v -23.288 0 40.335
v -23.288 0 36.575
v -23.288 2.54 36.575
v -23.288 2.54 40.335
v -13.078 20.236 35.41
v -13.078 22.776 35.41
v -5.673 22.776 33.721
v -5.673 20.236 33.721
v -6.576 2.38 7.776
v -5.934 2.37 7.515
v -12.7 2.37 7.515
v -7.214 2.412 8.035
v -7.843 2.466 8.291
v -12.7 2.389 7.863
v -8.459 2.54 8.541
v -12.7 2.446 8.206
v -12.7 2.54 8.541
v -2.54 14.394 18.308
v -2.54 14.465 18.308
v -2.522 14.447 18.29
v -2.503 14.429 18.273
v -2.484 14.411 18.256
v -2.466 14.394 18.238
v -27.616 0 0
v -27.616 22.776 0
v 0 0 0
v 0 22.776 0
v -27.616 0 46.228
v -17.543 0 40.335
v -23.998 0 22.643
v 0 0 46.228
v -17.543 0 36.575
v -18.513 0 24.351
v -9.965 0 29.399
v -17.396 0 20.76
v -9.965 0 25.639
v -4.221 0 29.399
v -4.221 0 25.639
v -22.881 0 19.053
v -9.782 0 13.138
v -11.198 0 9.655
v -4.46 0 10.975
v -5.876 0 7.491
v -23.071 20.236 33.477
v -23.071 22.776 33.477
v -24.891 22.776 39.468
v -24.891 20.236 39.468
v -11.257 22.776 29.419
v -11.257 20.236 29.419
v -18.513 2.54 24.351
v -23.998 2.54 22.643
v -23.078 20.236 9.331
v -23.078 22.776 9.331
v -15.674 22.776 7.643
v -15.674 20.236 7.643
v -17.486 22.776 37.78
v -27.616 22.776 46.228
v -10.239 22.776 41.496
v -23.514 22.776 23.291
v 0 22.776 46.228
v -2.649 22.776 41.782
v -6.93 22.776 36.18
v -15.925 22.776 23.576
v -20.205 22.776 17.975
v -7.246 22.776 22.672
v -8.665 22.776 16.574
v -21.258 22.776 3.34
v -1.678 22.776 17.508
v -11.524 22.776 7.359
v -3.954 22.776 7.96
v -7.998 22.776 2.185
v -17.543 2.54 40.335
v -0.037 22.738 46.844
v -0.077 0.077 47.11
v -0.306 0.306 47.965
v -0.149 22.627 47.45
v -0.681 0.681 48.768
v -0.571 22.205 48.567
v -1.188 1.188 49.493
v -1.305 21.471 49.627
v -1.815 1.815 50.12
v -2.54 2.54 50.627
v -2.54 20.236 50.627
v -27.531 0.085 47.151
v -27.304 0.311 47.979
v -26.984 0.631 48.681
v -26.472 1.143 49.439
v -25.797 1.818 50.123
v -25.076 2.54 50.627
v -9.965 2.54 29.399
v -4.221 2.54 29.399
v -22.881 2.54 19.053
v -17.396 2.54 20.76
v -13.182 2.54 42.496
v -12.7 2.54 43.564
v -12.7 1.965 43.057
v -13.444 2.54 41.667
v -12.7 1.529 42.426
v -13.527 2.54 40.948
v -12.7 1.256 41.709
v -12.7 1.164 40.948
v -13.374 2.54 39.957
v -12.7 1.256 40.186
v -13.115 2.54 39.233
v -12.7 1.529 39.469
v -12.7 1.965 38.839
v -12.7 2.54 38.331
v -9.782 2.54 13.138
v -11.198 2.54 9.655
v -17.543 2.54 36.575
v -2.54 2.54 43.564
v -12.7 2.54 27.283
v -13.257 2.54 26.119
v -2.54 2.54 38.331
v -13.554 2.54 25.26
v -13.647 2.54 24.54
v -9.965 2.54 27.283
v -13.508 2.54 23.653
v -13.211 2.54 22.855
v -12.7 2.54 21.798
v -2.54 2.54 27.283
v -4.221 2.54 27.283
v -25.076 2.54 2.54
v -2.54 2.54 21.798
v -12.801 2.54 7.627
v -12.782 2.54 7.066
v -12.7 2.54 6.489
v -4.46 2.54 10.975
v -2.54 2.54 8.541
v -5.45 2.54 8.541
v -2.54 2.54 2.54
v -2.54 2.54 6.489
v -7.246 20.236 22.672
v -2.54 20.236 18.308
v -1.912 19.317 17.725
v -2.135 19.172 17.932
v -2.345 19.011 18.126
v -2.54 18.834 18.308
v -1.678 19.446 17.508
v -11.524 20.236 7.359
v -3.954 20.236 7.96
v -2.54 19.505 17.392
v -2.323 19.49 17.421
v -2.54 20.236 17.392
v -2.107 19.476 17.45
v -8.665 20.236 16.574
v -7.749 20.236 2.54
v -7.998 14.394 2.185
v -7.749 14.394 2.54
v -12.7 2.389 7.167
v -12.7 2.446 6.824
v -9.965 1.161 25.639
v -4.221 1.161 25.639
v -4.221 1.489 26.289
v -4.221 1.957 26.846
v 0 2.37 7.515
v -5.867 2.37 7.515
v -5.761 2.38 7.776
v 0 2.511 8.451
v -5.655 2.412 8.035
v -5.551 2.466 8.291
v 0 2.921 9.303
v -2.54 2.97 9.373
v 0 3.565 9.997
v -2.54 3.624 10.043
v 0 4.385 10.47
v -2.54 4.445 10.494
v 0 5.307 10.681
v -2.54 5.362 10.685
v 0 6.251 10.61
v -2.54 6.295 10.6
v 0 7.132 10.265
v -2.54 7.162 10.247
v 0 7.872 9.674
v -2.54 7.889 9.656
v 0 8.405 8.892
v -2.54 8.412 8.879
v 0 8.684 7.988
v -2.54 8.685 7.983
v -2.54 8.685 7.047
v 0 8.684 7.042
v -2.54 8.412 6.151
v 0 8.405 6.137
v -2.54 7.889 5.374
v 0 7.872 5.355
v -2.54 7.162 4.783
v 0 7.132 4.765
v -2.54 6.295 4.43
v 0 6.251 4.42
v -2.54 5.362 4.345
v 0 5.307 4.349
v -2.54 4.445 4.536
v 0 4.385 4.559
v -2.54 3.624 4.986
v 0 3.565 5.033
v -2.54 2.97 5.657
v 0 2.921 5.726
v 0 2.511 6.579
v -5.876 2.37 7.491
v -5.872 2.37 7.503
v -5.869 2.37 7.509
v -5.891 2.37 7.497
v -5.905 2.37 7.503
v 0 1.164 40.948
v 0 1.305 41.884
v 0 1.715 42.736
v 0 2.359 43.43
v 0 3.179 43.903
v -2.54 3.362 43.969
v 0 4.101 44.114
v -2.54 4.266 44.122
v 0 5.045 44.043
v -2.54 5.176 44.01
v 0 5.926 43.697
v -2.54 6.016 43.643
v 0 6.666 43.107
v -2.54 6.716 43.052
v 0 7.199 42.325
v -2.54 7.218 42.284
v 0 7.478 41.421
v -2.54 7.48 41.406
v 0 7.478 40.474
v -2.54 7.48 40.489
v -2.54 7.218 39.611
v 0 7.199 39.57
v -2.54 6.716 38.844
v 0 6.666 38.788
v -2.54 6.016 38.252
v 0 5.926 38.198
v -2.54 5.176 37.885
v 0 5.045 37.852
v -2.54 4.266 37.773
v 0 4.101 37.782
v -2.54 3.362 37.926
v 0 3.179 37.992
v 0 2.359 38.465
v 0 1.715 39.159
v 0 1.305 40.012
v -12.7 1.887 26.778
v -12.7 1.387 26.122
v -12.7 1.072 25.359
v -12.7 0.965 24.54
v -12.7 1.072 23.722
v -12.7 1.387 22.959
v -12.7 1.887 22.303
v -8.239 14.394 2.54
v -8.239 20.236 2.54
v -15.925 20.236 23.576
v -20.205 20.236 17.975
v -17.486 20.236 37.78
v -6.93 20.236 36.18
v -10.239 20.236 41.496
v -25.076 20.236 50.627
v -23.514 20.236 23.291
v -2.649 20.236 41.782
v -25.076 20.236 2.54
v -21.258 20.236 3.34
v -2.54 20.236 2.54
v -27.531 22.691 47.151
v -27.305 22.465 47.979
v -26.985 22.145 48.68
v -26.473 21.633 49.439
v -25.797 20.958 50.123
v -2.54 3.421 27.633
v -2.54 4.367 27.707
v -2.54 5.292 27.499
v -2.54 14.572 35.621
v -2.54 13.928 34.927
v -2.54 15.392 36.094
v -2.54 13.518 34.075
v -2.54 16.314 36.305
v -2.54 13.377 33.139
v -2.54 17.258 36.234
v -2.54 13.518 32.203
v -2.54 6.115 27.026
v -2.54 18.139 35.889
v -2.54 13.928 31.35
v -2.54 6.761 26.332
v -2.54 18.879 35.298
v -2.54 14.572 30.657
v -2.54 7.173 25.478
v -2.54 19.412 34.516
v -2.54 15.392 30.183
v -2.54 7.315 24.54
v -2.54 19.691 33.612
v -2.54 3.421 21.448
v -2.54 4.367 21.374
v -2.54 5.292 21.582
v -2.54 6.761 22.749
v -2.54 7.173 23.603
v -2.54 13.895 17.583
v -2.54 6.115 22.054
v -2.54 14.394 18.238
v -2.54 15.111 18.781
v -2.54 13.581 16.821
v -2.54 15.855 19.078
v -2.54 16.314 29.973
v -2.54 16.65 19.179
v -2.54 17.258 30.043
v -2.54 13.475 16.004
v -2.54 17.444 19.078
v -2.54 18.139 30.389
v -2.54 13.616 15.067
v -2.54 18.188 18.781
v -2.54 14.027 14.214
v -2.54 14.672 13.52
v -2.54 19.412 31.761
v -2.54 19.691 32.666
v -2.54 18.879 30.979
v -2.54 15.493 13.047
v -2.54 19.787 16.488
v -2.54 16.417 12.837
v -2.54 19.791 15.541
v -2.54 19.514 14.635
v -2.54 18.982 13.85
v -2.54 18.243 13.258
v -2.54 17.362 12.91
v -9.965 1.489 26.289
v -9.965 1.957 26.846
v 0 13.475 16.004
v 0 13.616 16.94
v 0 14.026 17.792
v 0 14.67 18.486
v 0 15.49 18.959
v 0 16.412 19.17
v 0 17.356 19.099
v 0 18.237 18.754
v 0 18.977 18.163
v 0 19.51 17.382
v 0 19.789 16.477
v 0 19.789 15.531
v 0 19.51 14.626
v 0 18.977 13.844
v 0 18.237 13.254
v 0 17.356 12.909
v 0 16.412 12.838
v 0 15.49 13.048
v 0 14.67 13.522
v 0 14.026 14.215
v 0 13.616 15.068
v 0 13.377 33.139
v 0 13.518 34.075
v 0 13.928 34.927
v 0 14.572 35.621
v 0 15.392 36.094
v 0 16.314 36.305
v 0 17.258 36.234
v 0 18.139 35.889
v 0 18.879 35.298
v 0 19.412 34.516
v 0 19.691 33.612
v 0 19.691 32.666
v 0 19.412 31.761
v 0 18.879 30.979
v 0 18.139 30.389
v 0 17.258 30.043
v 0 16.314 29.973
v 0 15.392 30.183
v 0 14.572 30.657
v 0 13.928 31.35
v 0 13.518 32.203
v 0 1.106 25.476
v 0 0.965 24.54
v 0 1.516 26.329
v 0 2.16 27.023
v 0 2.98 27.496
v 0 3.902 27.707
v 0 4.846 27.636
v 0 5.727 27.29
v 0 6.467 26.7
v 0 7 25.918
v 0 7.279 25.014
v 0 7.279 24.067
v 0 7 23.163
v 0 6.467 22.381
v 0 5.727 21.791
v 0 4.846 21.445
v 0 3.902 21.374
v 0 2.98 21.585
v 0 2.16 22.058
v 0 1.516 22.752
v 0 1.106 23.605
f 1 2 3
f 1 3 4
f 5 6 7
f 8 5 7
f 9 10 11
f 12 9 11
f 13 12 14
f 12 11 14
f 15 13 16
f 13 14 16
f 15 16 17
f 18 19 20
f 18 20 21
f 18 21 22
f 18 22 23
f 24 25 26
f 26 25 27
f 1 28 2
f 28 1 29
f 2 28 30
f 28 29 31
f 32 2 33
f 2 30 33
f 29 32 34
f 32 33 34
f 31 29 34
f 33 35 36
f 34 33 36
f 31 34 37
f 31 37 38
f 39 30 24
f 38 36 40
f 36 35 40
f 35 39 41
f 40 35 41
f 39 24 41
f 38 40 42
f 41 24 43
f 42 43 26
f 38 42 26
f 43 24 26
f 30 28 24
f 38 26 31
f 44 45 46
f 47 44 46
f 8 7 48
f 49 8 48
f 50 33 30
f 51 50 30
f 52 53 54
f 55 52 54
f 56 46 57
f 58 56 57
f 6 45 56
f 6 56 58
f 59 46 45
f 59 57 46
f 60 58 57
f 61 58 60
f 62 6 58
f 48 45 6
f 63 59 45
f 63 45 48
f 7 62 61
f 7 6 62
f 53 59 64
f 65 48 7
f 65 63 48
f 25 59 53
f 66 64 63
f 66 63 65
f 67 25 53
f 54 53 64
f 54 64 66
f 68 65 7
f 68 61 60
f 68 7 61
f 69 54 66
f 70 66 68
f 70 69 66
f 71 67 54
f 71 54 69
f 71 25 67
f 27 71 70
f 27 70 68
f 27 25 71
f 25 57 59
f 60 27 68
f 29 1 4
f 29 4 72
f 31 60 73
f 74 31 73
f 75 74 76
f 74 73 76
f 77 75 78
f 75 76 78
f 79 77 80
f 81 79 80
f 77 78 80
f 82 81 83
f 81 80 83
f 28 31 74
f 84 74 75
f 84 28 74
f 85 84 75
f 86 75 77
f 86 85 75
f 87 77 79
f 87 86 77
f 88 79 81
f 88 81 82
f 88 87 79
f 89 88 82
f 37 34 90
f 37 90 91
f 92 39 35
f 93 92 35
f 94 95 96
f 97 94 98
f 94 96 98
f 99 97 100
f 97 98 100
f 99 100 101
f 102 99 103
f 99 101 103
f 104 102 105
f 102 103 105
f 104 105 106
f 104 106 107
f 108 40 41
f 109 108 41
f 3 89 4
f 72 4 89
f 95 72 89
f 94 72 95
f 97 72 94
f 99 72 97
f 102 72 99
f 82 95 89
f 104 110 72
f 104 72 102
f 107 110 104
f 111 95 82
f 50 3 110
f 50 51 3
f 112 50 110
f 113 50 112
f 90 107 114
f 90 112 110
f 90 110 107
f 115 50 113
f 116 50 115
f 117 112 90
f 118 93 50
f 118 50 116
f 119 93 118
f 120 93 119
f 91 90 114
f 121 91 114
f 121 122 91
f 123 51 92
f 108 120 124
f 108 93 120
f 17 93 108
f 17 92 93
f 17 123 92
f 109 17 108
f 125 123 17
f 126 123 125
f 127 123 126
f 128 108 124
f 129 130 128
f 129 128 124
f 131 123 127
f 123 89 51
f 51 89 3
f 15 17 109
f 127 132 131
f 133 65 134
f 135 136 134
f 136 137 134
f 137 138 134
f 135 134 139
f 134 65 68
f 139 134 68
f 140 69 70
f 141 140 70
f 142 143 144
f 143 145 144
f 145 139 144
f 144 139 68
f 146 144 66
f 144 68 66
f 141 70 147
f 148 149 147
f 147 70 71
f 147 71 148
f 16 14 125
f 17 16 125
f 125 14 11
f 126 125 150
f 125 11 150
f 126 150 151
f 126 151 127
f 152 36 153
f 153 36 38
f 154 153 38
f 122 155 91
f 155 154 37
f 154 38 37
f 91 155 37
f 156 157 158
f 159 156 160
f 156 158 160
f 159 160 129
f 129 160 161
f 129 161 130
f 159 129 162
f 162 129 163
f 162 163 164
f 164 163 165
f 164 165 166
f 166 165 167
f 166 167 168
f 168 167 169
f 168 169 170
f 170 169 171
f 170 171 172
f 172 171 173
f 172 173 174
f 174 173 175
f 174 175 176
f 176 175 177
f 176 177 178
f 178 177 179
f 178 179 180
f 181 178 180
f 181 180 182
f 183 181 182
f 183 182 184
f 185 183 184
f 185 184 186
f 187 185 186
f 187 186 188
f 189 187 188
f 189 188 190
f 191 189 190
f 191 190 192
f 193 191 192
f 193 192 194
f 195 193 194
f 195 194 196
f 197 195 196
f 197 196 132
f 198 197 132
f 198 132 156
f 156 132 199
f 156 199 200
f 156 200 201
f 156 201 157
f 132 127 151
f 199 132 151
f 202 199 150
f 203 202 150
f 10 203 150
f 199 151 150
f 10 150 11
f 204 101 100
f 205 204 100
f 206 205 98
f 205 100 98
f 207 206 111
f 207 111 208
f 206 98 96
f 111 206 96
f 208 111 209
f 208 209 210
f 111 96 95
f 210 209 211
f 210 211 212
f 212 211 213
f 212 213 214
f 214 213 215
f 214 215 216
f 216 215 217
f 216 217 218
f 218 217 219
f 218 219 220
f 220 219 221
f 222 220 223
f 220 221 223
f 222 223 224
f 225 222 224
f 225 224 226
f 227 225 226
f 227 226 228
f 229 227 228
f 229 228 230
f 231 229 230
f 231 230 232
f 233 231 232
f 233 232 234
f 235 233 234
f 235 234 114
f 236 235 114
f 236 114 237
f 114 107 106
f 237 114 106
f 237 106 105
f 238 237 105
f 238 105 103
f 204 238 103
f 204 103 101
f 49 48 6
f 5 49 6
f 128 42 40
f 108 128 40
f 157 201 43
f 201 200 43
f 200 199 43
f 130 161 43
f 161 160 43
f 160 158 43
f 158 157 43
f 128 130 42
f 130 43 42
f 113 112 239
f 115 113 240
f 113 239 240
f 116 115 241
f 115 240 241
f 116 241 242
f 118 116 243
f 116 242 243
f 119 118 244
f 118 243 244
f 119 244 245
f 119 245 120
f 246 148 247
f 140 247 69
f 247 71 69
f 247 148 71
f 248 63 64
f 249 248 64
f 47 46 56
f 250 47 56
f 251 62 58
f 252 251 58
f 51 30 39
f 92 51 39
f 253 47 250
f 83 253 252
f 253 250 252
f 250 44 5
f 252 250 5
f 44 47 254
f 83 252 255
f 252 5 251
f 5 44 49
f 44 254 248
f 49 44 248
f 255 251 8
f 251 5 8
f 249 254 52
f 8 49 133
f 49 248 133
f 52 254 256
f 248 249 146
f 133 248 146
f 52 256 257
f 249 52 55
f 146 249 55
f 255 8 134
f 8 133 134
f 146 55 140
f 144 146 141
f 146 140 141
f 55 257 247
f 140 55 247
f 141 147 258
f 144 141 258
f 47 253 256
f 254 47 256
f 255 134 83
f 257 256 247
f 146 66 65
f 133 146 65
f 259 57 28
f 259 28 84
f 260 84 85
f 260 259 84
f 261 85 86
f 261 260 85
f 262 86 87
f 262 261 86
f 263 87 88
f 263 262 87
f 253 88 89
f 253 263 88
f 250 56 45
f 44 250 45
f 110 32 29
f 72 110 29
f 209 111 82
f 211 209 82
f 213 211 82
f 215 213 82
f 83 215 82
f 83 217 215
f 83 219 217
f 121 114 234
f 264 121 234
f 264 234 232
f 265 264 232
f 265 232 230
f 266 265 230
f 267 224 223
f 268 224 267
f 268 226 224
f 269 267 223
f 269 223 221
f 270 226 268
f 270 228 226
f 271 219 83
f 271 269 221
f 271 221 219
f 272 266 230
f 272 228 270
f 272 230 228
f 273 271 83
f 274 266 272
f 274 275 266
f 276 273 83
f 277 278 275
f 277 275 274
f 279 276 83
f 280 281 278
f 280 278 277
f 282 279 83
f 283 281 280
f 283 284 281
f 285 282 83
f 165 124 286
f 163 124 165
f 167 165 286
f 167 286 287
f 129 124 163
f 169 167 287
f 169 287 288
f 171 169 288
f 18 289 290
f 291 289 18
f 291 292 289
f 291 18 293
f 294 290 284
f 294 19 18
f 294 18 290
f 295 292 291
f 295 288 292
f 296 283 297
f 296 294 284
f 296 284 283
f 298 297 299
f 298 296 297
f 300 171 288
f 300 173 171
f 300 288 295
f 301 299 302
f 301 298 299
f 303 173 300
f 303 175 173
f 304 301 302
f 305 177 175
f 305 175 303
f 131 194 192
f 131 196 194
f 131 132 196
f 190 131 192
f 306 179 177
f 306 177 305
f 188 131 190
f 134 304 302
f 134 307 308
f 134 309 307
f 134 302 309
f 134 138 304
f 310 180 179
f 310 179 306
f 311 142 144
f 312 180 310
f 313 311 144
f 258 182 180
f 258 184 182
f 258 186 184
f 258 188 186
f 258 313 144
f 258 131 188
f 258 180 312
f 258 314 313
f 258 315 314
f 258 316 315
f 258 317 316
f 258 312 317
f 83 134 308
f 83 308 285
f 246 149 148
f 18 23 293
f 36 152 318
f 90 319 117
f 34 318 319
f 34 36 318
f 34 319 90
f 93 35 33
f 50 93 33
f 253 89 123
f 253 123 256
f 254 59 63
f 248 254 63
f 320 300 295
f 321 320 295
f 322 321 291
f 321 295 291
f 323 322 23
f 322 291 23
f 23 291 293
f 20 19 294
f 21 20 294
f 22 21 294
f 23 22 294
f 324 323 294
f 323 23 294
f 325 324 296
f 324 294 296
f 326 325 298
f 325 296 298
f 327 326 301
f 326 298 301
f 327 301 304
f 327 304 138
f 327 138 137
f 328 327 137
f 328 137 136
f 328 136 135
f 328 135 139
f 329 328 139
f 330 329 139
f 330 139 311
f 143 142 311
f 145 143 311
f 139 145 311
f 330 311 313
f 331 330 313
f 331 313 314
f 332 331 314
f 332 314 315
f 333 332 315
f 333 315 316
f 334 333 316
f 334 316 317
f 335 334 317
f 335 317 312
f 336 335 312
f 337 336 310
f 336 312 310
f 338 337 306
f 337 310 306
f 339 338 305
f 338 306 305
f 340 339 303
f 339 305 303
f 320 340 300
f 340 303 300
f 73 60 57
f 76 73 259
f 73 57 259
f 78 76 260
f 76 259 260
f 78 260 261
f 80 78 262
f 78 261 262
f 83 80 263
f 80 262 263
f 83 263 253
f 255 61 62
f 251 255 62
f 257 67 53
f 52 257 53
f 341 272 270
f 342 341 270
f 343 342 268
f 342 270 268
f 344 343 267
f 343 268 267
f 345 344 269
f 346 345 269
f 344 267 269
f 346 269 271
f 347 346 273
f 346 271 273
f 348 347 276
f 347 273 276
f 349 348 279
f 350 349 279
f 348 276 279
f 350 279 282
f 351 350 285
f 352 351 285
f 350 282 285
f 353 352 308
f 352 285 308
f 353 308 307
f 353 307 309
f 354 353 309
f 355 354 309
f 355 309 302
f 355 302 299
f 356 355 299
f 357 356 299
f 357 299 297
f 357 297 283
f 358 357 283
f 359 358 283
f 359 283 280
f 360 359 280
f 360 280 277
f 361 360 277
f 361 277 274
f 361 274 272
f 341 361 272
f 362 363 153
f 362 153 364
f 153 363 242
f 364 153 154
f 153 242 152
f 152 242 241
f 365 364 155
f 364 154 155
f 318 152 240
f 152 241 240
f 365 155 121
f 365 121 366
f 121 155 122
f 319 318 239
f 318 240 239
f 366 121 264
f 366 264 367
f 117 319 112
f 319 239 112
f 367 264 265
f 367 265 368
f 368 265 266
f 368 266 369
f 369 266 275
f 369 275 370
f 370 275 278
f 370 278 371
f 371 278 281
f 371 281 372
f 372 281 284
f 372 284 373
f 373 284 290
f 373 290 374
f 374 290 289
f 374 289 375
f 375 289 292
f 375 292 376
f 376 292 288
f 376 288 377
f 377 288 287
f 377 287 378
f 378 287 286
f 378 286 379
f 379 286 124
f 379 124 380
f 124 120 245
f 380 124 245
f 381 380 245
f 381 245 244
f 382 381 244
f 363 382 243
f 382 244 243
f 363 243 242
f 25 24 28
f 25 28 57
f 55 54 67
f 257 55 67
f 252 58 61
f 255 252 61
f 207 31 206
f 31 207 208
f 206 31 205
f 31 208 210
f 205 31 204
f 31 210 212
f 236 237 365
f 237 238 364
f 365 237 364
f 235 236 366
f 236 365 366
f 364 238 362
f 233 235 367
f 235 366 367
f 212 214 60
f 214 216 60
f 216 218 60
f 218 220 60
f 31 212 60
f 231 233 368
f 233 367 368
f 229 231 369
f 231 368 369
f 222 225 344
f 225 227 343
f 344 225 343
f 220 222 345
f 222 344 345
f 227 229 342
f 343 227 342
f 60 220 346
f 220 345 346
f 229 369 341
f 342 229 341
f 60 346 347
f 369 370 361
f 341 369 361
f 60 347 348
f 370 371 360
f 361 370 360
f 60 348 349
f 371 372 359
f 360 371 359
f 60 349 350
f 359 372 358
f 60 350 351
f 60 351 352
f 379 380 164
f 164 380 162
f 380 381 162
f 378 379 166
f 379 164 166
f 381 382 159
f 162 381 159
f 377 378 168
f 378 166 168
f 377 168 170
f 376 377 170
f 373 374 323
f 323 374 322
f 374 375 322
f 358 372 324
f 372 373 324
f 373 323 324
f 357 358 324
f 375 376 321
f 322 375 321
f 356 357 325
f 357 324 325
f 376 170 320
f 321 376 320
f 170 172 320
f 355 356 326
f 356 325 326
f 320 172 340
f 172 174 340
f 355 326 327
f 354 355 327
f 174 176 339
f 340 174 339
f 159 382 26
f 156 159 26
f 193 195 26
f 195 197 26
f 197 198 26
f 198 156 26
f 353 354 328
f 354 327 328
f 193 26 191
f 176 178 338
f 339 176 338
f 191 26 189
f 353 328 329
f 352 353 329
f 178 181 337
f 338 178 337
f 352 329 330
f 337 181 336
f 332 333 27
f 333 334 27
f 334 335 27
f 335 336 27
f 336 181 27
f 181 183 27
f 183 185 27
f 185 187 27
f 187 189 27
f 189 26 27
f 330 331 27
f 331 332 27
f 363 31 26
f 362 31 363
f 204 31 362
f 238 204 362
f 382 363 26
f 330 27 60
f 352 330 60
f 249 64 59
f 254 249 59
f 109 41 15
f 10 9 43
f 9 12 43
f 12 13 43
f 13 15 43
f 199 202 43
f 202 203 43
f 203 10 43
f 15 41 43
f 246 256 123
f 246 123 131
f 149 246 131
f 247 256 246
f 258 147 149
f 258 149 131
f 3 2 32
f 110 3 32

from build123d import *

# Parameters (mm, degrees)
F0_W        = 27.615731582
F0_H        = 22.7759163827
F1_DEPTH    = 51.308
F2_T        = -2.54
F3_T1_DEPTH = 53.015731582
F3_T3_DEPTH = 48.1759163827
F4_W        = 5.7445205748
F4_H        = 3.7603080273
F5_DEPTH    = 4.826
F7_D        = 6.35
F7_DEPTH    = 12.7
F7_TIP      = 1.9077324654
F9_DEPTH    = 8.382


# Not quite as in the source:
# - a fillet or chamfer that OpenCascade refuses, or shapes differently, is made with other operations: its cross-section is extruded or revolved along the edge and cut away or added


with BuildPart() as f1:
    # F0 (on Top) → F1 (new body)
    with BuildSketch(Plane.XY):
        with Locations((-13.807865791, 11.3879581913)):
            Rectangle(F0_W, F0_H)
    extrude(amount=F1_DEPTH)

    # F2
    f2_openings = [f1.faces().sort_by_distance(p)[0] for p in [
        (-13.807866, 11.387958, 51.308),
    ]]
    offset(amount=F2_T, openings=f2_openings)

    # F3: fillet of radius 5.08 on 4 edges, made by hand

    # F3_s2 → F3_t1 (cut)
    with BuildSketch(Plane.YZ.offset(-40.315731582)):
        with BuildLine():
            ThreePointArc((0, 46.228), (1.4878975516, 49.8201024484), (5.08, 51.308))
            Line((5.08, 51.308), (0, 51.308))
            Line((0, 51.308), (0, 46.228))
        make_face()
        with BuildLine():
            ThreePointArc((22.7759163827, 46.228), (21.2880188311, 49.8201024484), (17.6959163827, 51.308))
            Line((17.6959163827, 51.308), (22.7759163827, 51.308))
            Line((22.7759163827, 51.308), (22.7759163827, 46.228))
        make_face()
    extrude(amount=F3_T1_DEPTH, mode=Mode.SUBTRACT)

    # F3_s4 → F3_t3 (cut)
    with BuildSketch(Plane.XZ.offset(-35.4759163827)):
        with BuildLine():
            ThreePointArc((-27.615731582, 46.228), (-26.1278340305, 49.8201024484), (-22.535731582, 51.308))
            Line((-22.535731582, 51.308), (-27.615731582, 51.308))
            Line((-27.615731582, 51.308), (-27.615731582, 46.228))
        make_face()
        with BuildLine():
            ThreePointArc((0, 46.228), (-1.4878975516, 49.8201024484), (-5.08, 51.308))
            Line((-5.08, 51.308), (0, 51.308))
            Line((0, 51.308), (0, 46.228))
        make_face()
    extrude(amount=F3_T3_DEPTH, mode=Mode.SUBTRACT)

    # F4 (on face) → F5 (cut)
    with BuildSketch(Plane.XZ):
        with Locations((-20.4156730324, 38.4546555579)):
            Rectangle(F4_W, F4_H)
        with Locations((-7.0931273513, 27.5189299136)):
            Rectangle(F4_W, F4_H)
        Polygon((-18.5130548821, 24.3505493797), (-23.9980506161, 22.6434060253), (-22.880570963, 19.0529804677), (-17.395575229, 20.7601238221), align=None)
        Polygon((-4.4602522607, 10.9747632246), (-9.781830883, 13.1381673943), (-11.1979744862, 9.6547131094), (-5.8763958639, 7.4913089397), align=None)
    extrude(amount=-F5_DEPTH, mode=Mode.SUBTRACT)

    # F7
    with Locations(Plane.YZ):
        with Locations((4.3385280296, 40.9476608038), (16.5516659617, 33.1388860941), (4.1396417655, 24.540392682), (16.6495069861, 16.0039383918), (5.5445204489, 7.5149172917)):
            Hole(F7_D / 2, depth=F7_DEPTH)
            with Locations((0, 0, -(F7_DEPTH + F7_TIP / 2))):  # 118° drill point
                Cone(0, F7_D / 2, F7_TIP, mode=Mode.SUBTRACT)

    # F8 (on face) → F9 (cut)
    with BuildSketch(Plane(origin=(0, 22.7759163827, 0), x_dir=(-1, 0, 0), z_dir=(0, 1, 0))):
        Polygon((13.0775338039, 35.4098752141), (5.6731416844, 33.7212570012), (11.2572079524, 29.4185951352), align=None)
        Polygon((23.5141057819, 23.2905662243), (15.9249656523, 23.5758839796), (20.2051486408, 17.9745690622), align=None)
        Polygon((7.2458156385, 22.6723130022), (1.6777330699, 17.5077306728), (8.6650072474, 16.573549327), align=None)
        Polygon((23.0783666484, 9.331129957), (15.6739745289, 7.6425117441), (21.258040797, 3.3398498781), align=None)
        Polygon((11.5244448229, 7.3593156172), (3.9536968494, 7.9595066297), (7.997608447, 2.1852989602), align=None)
        Polygon((24.8908895689, 39.4682685534), (17.4864974494, 37.7796503405), (23.0705637174, 33.4769884745), align=None)
        Polygon((10.2386324033, 41.4962964688), (2.6494922737, 41.7816142241), (6.9296752622, 36.1802993067), align=None)
    extrude(amount=-F9_DEPTH, mode=Mode.SUBTRACT)


solid = f1.part
